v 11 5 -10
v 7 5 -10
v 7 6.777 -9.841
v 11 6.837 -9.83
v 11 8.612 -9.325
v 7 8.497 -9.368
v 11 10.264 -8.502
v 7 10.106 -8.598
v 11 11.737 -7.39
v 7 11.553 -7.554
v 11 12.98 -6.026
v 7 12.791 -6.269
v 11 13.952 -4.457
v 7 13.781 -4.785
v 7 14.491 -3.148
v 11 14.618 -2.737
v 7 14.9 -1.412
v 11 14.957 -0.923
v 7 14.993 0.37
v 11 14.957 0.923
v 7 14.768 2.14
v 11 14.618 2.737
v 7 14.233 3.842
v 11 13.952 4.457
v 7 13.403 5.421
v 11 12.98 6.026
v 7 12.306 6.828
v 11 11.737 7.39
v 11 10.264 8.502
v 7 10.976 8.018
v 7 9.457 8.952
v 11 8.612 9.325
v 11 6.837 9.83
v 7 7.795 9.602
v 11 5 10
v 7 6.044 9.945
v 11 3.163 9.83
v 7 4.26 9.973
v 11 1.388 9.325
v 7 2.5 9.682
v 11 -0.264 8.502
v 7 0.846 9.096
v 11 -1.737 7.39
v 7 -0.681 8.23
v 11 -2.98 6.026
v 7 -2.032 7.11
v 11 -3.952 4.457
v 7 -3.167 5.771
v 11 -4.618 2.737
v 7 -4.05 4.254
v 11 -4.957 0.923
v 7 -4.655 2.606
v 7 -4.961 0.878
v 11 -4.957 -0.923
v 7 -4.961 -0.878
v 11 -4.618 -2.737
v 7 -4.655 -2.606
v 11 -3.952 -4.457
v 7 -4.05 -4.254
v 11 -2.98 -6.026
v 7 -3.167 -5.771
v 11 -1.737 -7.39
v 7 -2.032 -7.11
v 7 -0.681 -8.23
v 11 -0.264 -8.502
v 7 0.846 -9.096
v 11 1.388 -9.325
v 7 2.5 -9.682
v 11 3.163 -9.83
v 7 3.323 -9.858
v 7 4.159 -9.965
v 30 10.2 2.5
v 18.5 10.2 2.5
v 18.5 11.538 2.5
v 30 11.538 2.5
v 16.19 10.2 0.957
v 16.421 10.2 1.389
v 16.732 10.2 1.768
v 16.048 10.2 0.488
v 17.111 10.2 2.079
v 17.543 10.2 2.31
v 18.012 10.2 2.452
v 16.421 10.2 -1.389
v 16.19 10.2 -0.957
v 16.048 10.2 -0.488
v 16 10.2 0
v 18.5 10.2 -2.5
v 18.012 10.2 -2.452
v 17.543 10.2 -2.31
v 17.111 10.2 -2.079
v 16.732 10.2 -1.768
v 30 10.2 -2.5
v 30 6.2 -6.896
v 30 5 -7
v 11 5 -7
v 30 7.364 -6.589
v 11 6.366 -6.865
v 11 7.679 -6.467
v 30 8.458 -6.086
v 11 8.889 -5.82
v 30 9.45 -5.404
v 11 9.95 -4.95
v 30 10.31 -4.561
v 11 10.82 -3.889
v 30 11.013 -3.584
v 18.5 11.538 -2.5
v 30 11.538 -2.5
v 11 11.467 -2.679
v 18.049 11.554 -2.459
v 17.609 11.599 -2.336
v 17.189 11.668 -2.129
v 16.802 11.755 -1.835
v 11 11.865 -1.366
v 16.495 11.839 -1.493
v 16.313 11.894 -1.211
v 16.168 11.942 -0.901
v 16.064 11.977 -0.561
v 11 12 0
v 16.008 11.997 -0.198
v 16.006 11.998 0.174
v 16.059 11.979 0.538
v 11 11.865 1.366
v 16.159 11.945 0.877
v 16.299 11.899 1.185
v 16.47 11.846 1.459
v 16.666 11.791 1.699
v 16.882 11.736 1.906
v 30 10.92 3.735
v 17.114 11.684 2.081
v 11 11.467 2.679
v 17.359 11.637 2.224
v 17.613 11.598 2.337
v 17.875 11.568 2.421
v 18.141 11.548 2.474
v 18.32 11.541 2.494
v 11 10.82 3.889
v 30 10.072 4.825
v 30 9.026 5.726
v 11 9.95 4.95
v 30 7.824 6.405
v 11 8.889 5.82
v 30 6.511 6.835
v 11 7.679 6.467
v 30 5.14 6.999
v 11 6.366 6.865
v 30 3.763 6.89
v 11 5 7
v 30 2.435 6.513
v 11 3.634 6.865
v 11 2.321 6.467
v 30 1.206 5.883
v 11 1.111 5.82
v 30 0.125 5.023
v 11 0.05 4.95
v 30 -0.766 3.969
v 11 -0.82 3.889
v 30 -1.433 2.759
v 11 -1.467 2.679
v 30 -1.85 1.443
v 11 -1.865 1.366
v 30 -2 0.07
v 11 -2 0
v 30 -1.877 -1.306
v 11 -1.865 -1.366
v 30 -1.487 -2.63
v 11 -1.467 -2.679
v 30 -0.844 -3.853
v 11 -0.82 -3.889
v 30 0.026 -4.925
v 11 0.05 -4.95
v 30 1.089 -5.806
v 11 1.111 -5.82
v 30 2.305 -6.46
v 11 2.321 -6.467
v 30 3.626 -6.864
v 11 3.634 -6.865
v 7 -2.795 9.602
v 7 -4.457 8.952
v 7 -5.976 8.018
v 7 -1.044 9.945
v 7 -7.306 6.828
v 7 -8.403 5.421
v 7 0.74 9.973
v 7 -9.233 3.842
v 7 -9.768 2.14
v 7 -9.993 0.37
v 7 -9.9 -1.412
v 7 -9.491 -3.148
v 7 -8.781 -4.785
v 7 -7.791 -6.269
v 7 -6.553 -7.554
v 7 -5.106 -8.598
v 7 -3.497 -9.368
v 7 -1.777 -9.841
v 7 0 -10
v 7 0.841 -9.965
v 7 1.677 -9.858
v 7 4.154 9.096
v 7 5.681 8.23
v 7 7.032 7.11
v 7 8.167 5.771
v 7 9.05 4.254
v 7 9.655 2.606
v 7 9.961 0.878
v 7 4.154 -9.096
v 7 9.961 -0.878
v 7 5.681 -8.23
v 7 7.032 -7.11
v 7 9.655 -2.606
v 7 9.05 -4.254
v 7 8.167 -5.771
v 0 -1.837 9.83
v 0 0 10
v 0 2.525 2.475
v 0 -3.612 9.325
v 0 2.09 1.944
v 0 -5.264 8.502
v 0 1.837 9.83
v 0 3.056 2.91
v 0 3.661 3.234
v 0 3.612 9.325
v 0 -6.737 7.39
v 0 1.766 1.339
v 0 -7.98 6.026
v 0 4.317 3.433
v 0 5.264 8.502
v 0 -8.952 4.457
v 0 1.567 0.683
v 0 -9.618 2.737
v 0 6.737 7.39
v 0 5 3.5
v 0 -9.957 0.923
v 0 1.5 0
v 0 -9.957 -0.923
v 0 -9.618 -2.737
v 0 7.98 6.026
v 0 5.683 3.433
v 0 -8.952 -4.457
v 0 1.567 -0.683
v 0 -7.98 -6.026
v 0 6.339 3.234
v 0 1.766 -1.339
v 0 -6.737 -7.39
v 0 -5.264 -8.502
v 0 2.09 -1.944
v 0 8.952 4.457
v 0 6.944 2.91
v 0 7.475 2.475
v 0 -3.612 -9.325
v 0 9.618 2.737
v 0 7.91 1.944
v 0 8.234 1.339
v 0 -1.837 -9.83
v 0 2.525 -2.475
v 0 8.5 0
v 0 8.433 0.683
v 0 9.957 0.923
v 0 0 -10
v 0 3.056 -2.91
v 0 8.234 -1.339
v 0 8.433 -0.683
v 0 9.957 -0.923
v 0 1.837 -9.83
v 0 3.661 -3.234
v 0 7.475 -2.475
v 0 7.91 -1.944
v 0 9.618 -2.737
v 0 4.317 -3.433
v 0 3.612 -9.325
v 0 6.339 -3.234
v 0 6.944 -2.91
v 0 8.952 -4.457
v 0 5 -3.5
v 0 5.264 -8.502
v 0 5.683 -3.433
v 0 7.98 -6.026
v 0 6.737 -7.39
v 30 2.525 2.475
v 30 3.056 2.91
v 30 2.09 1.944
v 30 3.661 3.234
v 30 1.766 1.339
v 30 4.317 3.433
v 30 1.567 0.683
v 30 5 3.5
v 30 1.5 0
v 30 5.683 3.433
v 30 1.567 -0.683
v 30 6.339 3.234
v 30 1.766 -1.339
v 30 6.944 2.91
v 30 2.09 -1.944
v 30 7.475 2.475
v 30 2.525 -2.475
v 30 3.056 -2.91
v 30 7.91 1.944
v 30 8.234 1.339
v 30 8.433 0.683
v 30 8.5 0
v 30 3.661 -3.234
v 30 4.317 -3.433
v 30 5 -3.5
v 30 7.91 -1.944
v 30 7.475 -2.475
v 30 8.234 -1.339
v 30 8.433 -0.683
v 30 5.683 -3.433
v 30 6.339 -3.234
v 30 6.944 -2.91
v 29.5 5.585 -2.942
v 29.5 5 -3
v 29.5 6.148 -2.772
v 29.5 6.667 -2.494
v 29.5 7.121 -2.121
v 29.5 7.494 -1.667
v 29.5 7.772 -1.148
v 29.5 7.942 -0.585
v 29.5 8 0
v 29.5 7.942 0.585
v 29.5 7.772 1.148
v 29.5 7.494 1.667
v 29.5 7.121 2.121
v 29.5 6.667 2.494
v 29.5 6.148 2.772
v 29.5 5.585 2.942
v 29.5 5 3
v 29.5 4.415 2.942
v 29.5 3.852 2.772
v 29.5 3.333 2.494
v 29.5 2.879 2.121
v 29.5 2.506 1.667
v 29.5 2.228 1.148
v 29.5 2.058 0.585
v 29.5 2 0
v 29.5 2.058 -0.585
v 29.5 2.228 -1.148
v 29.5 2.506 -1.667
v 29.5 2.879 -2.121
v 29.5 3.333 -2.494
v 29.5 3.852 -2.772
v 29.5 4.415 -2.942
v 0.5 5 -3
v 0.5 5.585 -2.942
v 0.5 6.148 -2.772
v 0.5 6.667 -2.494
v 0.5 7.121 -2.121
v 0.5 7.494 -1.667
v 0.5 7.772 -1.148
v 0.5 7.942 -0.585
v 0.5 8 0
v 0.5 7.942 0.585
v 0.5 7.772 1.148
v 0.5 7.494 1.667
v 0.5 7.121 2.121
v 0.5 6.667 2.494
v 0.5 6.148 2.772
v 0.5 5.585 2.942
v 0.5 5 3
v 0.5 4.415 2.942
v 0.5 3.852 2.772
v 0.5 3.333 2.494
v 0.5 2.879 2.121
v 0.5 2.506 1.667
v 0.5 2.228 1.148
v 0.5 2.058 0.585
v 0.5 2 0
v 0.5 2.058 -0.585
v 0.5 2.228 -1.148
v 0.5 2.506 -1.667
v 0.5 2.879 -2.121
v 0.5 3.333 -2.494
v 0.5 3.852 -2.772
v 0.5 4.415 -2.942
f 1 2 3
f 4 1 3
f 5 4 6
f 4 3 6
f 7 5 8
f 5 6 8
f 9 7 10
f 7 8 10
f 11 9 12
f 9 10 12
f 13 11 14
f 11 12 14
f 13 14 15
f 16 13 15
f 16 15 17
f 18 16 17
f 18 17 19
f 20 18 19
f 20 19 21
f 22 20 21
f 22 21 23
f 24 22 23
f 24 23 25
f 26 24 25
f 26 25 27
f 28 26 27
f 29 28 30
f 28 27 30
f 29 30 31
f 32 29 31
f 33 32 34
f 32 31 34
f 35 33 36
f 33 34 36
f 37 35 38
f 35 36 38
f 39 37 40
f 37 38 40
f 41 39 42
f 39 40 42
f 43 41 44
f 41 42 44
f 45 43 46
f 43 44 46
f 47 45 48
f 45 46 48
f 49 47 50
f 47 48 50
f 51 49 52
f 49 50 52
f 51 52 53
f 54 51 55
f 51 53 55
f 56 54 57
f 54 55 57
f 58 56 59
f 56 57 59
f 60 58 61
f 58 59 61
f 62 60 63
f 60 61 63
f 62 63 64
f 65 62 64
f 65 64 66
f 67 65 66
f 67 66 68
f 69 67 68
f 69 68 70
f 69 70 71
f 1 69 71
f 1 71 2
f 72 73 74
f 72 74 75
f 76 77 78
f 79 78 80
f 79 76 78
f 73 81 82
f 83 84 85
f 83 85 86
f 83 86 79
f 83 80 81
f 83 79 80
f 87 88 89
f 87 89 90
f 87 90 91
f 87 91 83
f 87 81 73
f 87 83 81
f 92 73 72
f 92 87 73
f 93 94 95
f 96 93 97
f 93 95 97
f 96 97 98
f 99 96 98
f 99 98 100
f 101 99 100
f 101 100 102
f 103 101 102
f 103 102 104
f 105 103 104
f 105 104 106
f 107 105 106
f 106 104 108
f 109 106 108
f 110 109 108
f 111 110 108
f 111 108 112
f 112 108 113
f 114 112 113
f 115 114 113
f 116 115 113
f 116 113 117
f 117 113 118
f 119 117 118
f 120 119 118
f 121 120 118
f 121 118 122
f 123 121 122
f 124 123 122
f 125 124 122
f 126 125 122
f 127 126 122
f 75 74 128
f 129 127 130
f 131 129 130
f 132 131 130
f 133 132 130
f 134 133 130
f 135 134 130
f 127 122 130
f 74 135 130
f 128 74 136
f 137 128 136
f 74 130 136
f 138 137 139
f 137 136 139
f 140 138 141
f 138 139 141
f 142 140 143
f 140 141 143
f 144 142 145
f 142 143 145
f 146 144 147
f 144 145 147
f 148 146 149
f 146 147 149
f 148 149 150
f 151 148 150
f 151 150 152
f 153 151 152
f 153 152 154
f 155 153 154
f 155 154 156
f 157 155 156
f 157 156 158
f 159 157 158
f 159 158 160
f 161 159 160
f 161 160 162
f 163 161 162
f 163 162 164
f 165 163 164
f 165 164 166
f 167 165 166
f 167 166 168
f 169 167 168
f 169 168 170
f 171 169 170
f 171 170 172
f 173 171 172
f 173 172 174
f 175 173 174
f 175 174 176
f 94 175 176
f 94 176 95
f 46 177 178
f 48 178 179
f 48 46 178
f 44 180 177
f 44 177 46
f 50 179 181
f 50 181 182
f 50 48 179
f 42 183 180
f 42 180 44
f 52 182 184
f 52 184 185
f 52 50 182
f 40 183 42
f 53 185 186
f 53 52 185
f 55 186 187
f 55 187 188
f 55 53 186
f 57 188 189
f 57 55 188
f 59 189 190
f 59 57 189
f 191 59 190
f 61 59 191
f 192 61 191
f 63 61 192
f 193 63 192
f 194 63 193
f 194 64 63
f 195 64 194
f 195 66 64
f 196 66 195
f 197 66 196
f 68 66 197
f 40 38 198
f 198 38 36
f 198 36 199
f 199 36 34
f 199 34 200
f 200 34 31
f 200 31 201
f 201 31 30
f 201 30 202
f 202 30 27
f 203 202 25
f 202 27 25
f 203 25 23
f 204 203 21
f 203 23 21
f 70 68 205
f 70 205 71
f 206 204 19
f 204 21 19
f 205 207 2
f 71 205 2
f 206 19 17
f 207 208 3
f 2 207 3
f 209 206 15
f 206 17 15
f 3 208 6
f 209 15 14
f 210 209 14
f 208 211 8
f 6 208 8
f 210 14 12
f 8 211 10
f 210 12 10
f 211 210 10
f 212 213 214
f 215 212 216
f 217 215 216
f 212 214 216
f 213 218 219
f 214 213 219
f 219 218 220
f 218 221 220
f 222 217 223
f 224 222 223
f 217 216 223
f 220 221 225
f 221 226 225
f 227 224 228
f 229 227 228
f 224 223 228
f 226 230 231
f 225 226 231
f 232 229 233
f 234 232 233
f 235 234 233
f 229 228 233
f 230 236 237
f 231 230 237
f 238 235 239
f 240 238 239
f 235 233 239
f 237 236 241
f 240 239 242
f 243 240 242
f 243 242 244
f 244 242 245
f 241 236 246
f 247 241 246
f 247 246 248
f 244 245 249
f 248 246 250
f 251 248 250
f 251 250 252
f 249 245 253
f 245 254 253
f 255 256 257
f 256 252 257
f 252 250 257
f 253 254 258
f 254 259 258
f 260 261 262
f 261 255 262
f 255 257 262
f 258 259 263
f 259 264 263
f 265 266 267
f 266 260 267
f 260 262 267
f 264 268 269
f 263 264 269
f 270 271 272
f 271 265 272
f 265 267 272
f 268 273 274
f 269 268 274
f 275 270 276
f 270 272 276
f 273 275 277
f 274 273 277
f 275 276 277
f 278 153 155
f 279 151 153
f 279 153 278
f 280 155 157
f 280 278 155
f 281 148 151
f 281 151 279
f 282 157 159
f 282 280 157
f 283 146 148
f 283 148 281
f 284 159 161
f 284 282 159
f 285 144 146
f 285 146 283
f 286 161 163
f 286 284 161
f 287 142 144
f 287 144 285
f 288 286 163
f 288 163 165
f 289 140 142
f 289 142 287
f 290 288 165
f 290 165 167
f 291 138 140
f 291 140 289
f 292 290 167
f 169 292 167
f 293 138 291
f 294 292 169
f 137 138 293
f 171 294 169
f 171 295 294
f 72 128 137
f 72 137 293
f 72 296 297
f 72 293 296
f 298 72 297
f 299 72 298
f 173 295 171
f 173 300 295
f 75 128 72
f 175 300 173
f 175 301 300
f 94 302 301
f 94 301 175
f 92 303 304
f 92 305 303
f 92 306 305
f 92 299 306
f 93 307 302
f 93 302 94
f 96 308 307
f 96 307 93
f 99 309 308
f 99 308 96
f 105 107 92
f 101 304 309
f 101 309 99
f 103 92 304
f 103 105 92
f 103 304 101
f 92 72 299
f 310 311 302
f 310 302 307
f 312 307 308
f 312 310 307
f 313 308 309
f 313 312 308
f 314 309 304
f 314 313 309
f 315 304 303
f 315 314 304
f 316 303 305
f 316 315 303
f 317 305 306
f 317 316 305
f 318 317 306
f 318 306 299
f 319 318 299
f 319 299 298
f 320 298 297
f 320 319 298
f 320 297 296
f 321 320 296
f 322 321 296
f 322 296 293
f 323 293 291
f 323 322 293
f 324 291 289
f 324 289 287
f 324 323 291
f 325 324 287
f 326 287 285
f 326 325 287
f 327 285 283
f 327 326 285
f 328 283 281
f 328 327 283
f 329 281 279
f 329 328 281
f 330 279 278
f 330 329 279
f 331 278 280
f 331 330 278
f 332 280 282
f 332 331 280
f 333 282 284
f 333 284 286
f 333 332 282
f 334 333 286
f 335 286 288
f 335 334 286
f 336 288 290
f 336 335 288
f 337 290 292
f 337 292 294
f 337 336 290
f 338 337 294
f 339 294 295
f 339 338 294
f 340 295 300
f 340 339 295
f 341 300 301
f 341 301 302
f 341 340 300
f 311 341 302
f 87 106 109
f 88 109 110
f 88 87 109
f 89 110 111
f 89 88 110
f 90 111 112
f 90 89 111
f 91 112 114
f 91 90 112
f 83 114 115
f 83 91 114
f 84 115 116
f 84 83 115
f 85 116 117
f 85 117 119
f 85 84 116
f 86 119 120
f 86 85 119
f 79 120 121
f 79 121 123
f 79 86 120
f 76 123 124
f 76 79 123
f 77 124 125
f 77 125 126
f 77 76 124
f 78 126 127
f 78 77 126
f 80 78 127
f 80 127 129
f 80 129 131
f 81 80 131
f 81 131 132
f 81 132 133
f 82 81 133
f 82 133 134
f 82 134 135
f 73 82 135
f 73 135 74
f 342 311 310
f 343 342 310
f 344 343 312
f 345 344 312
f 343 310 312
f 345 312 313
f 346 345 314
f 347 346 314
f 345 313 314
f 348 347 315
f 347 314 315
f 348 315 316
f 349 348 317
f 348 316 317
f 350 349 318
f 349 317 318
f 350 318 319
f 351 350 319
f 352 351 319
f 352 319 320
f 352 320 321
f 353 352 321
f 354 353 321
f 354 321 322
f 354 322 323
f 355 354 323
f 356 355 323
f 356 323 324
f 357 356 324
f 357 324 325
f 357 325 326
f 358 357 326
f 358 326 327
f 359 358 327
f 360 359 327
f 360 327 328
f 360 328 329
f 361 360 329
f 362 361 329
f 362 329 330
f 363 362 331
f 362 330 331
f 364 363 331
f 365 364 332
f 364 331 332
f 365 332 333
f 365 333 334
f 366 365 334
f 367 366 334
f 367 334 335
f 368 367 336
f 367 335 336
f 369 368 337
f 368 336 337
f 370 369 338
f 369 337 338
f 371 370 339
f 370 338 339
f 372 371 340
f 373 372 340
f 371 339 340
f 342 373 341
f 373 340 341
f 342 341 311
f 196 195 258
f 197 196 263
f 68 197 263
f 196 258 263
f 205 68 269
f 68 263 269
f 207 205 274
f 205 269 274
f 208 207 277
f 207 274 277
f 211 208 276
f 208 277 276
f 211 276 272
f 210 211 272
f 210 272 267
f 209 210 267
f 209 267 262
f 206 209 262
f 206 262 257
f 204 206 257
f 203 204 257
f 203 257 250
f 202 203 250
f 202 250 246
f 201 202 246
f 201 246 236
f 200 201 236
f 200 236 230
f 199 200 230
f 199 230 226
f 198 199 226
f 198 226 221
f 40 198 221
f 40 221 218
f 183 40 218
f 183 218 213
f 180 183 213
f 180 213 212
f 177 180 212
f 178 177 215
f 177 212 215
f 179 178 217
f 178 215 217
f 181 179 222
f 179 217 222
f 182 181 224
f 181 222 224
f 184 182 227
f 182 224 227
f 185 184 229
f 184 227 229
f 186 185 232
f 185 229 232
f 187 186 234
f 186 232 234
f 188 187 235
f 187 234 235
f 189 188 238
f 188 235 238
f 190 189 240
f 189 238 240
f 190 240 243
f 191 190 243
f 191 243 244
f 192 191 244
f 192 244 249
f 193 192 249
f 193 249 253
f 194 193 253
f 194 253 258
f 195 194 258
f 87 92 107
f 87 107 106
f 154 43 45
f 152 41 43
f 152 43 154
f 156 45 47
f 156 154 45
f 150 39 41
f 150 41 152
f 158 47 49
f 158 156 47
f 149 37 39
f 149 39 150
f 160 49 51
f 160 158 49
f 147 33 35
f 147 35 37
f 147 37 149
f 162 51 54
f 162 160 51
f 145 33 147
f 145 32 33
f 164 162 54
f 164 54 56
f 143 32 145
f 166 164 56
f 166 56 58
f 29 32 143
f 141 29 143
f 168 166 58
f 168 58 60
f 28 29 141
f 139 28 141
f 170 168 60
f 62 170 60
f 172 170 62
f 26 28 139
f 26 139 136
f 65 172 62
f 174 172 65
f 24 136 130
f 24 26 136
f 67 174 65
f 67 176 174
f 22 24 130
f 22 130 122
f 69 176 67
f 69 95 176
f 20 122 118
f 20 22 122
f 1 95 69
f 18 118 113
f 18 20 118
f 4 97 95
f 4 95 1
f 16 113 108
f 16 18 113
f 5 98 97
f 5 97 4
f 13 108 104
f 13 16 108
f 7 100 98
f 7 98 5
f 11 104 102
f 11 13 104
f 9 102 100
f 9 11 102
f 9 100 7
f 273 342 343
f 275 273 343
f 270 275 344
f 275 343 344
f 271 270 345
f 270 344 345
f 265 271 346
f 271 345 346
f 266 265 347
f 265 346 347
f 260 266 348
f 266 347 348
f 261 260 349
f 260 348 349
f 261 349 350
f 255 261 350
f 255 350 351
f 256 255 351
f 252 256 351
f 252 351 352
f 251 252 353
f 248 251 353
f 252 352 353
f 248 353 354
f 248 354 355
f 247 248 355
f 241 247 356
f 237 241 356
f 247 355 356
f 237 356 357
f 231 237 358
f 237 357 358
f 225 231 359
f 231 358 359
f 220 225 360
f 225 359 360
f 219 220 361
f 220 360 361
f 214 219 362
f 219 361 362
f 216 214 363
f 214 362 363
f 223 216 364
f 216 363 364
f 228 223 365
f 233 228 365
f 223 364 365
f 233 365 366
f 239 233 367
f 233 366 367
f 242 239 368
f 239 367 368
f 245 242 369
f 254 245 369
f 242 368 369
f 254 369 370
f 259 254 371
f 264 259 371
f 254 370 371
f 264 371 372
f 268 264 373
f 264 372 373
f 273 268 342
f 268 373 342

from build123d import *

# Parameters (mm, degrees)
SKETCH1_R           = 10
BOSS_EXTRUDE1_DEPTH = 7
SKETCH2_R           = 10
BOSS_EXTRUDE2_DEPTH = 4
SKETCH3_R           = 7
BOSS_EXTRUDE3_DEPTH = 19
SKETCH4_R           = 3
CUT_EXTRUDE1_DEPTH  = 31
CHAMFER1_SIZE       = 0.5
CUT_EXTRUDE2_START  = 10.2
CUT_EXTRUDE2_DEPTH  = 5.8


with BuildPart() as part:
    # Sketch1 → Boss-Extrude1 (new body)
    with BuildSketch(Plane(origin=(0, 0, 0), x_dir=(0, 0, -1), z_dir=(1, 0, 0))):
        Circle(SKETCH1_R)
    extrude(amount=BOSS_EXTRUDE1_DEPTH)

    # Sketch2 → Boss-Extrude2 (add)
    with BuildSketch(Plane(origin=(7, 0, 0), x_dir=(0, 0, -1), z_dir=(1, 0, 0))):
        with Locations((0, 5)):
            Circle(SKETCH2_R)
    extrude(amount=BOSS_EXTRUDE2_DEPTH)

    # Sketch3 → Boss-Extrude3 (add)
    with BuildSketch(Plane(origin=(11, 0, 0), x_dir=(0, 0, -1), z_dir=(1, 0, 0))):
        with Locations((0, 5)):
            Circle(SKETCH3_R)
    extrude(amount=BOSS_EXTRUDE3_DEPTH)

    # Sketch4 → Cut-Extrude1 (cut, through all)
    with BuildSketch(Plane(origin=(30, 0, 0), x_dir=(0, 0, -1), z_dir=(1, 0, 0))):
        with Locations((0, 5)):
            Circle(SKETCH4_R)
    extrude(amount=-CUT_EXTRUDE1_DEPTH, mode=Mode.SUBTRACT)

    # Chamfer1
    chamfer1_edges = [part.edges().sort_by_distance(p)[0] for p in [
        (0, 5, 3),
        (30, 5, 3),
    ]]
    chamfer(chamfer1_edges, length=CHAMFER1_SIZE)

    # Sketch5 → Cut-Extrude2 (cut, through all)
    with BuildSketch(Plane(origin=(0, 0, 0), x_dir=(1, 0, 0), z_dir=(0, 1, 0)).offset(CUT_EXTRUDE2_START)):
        with BuildLine():
            Line((31, 2.5), (18.5, 2.5))
            ThreePointArc((18.5, 2.5), (16, 0), (18.5, -2.5))
            Line((18.5, -2.5), (31, -2.5))
            Line((31, -2.5), (31, 2.5))
        make_face()
    extrude(amount=CUT_EXTRUDE2_DEPTH, mode=Mode.SUBTRACT)


solid = part.part
